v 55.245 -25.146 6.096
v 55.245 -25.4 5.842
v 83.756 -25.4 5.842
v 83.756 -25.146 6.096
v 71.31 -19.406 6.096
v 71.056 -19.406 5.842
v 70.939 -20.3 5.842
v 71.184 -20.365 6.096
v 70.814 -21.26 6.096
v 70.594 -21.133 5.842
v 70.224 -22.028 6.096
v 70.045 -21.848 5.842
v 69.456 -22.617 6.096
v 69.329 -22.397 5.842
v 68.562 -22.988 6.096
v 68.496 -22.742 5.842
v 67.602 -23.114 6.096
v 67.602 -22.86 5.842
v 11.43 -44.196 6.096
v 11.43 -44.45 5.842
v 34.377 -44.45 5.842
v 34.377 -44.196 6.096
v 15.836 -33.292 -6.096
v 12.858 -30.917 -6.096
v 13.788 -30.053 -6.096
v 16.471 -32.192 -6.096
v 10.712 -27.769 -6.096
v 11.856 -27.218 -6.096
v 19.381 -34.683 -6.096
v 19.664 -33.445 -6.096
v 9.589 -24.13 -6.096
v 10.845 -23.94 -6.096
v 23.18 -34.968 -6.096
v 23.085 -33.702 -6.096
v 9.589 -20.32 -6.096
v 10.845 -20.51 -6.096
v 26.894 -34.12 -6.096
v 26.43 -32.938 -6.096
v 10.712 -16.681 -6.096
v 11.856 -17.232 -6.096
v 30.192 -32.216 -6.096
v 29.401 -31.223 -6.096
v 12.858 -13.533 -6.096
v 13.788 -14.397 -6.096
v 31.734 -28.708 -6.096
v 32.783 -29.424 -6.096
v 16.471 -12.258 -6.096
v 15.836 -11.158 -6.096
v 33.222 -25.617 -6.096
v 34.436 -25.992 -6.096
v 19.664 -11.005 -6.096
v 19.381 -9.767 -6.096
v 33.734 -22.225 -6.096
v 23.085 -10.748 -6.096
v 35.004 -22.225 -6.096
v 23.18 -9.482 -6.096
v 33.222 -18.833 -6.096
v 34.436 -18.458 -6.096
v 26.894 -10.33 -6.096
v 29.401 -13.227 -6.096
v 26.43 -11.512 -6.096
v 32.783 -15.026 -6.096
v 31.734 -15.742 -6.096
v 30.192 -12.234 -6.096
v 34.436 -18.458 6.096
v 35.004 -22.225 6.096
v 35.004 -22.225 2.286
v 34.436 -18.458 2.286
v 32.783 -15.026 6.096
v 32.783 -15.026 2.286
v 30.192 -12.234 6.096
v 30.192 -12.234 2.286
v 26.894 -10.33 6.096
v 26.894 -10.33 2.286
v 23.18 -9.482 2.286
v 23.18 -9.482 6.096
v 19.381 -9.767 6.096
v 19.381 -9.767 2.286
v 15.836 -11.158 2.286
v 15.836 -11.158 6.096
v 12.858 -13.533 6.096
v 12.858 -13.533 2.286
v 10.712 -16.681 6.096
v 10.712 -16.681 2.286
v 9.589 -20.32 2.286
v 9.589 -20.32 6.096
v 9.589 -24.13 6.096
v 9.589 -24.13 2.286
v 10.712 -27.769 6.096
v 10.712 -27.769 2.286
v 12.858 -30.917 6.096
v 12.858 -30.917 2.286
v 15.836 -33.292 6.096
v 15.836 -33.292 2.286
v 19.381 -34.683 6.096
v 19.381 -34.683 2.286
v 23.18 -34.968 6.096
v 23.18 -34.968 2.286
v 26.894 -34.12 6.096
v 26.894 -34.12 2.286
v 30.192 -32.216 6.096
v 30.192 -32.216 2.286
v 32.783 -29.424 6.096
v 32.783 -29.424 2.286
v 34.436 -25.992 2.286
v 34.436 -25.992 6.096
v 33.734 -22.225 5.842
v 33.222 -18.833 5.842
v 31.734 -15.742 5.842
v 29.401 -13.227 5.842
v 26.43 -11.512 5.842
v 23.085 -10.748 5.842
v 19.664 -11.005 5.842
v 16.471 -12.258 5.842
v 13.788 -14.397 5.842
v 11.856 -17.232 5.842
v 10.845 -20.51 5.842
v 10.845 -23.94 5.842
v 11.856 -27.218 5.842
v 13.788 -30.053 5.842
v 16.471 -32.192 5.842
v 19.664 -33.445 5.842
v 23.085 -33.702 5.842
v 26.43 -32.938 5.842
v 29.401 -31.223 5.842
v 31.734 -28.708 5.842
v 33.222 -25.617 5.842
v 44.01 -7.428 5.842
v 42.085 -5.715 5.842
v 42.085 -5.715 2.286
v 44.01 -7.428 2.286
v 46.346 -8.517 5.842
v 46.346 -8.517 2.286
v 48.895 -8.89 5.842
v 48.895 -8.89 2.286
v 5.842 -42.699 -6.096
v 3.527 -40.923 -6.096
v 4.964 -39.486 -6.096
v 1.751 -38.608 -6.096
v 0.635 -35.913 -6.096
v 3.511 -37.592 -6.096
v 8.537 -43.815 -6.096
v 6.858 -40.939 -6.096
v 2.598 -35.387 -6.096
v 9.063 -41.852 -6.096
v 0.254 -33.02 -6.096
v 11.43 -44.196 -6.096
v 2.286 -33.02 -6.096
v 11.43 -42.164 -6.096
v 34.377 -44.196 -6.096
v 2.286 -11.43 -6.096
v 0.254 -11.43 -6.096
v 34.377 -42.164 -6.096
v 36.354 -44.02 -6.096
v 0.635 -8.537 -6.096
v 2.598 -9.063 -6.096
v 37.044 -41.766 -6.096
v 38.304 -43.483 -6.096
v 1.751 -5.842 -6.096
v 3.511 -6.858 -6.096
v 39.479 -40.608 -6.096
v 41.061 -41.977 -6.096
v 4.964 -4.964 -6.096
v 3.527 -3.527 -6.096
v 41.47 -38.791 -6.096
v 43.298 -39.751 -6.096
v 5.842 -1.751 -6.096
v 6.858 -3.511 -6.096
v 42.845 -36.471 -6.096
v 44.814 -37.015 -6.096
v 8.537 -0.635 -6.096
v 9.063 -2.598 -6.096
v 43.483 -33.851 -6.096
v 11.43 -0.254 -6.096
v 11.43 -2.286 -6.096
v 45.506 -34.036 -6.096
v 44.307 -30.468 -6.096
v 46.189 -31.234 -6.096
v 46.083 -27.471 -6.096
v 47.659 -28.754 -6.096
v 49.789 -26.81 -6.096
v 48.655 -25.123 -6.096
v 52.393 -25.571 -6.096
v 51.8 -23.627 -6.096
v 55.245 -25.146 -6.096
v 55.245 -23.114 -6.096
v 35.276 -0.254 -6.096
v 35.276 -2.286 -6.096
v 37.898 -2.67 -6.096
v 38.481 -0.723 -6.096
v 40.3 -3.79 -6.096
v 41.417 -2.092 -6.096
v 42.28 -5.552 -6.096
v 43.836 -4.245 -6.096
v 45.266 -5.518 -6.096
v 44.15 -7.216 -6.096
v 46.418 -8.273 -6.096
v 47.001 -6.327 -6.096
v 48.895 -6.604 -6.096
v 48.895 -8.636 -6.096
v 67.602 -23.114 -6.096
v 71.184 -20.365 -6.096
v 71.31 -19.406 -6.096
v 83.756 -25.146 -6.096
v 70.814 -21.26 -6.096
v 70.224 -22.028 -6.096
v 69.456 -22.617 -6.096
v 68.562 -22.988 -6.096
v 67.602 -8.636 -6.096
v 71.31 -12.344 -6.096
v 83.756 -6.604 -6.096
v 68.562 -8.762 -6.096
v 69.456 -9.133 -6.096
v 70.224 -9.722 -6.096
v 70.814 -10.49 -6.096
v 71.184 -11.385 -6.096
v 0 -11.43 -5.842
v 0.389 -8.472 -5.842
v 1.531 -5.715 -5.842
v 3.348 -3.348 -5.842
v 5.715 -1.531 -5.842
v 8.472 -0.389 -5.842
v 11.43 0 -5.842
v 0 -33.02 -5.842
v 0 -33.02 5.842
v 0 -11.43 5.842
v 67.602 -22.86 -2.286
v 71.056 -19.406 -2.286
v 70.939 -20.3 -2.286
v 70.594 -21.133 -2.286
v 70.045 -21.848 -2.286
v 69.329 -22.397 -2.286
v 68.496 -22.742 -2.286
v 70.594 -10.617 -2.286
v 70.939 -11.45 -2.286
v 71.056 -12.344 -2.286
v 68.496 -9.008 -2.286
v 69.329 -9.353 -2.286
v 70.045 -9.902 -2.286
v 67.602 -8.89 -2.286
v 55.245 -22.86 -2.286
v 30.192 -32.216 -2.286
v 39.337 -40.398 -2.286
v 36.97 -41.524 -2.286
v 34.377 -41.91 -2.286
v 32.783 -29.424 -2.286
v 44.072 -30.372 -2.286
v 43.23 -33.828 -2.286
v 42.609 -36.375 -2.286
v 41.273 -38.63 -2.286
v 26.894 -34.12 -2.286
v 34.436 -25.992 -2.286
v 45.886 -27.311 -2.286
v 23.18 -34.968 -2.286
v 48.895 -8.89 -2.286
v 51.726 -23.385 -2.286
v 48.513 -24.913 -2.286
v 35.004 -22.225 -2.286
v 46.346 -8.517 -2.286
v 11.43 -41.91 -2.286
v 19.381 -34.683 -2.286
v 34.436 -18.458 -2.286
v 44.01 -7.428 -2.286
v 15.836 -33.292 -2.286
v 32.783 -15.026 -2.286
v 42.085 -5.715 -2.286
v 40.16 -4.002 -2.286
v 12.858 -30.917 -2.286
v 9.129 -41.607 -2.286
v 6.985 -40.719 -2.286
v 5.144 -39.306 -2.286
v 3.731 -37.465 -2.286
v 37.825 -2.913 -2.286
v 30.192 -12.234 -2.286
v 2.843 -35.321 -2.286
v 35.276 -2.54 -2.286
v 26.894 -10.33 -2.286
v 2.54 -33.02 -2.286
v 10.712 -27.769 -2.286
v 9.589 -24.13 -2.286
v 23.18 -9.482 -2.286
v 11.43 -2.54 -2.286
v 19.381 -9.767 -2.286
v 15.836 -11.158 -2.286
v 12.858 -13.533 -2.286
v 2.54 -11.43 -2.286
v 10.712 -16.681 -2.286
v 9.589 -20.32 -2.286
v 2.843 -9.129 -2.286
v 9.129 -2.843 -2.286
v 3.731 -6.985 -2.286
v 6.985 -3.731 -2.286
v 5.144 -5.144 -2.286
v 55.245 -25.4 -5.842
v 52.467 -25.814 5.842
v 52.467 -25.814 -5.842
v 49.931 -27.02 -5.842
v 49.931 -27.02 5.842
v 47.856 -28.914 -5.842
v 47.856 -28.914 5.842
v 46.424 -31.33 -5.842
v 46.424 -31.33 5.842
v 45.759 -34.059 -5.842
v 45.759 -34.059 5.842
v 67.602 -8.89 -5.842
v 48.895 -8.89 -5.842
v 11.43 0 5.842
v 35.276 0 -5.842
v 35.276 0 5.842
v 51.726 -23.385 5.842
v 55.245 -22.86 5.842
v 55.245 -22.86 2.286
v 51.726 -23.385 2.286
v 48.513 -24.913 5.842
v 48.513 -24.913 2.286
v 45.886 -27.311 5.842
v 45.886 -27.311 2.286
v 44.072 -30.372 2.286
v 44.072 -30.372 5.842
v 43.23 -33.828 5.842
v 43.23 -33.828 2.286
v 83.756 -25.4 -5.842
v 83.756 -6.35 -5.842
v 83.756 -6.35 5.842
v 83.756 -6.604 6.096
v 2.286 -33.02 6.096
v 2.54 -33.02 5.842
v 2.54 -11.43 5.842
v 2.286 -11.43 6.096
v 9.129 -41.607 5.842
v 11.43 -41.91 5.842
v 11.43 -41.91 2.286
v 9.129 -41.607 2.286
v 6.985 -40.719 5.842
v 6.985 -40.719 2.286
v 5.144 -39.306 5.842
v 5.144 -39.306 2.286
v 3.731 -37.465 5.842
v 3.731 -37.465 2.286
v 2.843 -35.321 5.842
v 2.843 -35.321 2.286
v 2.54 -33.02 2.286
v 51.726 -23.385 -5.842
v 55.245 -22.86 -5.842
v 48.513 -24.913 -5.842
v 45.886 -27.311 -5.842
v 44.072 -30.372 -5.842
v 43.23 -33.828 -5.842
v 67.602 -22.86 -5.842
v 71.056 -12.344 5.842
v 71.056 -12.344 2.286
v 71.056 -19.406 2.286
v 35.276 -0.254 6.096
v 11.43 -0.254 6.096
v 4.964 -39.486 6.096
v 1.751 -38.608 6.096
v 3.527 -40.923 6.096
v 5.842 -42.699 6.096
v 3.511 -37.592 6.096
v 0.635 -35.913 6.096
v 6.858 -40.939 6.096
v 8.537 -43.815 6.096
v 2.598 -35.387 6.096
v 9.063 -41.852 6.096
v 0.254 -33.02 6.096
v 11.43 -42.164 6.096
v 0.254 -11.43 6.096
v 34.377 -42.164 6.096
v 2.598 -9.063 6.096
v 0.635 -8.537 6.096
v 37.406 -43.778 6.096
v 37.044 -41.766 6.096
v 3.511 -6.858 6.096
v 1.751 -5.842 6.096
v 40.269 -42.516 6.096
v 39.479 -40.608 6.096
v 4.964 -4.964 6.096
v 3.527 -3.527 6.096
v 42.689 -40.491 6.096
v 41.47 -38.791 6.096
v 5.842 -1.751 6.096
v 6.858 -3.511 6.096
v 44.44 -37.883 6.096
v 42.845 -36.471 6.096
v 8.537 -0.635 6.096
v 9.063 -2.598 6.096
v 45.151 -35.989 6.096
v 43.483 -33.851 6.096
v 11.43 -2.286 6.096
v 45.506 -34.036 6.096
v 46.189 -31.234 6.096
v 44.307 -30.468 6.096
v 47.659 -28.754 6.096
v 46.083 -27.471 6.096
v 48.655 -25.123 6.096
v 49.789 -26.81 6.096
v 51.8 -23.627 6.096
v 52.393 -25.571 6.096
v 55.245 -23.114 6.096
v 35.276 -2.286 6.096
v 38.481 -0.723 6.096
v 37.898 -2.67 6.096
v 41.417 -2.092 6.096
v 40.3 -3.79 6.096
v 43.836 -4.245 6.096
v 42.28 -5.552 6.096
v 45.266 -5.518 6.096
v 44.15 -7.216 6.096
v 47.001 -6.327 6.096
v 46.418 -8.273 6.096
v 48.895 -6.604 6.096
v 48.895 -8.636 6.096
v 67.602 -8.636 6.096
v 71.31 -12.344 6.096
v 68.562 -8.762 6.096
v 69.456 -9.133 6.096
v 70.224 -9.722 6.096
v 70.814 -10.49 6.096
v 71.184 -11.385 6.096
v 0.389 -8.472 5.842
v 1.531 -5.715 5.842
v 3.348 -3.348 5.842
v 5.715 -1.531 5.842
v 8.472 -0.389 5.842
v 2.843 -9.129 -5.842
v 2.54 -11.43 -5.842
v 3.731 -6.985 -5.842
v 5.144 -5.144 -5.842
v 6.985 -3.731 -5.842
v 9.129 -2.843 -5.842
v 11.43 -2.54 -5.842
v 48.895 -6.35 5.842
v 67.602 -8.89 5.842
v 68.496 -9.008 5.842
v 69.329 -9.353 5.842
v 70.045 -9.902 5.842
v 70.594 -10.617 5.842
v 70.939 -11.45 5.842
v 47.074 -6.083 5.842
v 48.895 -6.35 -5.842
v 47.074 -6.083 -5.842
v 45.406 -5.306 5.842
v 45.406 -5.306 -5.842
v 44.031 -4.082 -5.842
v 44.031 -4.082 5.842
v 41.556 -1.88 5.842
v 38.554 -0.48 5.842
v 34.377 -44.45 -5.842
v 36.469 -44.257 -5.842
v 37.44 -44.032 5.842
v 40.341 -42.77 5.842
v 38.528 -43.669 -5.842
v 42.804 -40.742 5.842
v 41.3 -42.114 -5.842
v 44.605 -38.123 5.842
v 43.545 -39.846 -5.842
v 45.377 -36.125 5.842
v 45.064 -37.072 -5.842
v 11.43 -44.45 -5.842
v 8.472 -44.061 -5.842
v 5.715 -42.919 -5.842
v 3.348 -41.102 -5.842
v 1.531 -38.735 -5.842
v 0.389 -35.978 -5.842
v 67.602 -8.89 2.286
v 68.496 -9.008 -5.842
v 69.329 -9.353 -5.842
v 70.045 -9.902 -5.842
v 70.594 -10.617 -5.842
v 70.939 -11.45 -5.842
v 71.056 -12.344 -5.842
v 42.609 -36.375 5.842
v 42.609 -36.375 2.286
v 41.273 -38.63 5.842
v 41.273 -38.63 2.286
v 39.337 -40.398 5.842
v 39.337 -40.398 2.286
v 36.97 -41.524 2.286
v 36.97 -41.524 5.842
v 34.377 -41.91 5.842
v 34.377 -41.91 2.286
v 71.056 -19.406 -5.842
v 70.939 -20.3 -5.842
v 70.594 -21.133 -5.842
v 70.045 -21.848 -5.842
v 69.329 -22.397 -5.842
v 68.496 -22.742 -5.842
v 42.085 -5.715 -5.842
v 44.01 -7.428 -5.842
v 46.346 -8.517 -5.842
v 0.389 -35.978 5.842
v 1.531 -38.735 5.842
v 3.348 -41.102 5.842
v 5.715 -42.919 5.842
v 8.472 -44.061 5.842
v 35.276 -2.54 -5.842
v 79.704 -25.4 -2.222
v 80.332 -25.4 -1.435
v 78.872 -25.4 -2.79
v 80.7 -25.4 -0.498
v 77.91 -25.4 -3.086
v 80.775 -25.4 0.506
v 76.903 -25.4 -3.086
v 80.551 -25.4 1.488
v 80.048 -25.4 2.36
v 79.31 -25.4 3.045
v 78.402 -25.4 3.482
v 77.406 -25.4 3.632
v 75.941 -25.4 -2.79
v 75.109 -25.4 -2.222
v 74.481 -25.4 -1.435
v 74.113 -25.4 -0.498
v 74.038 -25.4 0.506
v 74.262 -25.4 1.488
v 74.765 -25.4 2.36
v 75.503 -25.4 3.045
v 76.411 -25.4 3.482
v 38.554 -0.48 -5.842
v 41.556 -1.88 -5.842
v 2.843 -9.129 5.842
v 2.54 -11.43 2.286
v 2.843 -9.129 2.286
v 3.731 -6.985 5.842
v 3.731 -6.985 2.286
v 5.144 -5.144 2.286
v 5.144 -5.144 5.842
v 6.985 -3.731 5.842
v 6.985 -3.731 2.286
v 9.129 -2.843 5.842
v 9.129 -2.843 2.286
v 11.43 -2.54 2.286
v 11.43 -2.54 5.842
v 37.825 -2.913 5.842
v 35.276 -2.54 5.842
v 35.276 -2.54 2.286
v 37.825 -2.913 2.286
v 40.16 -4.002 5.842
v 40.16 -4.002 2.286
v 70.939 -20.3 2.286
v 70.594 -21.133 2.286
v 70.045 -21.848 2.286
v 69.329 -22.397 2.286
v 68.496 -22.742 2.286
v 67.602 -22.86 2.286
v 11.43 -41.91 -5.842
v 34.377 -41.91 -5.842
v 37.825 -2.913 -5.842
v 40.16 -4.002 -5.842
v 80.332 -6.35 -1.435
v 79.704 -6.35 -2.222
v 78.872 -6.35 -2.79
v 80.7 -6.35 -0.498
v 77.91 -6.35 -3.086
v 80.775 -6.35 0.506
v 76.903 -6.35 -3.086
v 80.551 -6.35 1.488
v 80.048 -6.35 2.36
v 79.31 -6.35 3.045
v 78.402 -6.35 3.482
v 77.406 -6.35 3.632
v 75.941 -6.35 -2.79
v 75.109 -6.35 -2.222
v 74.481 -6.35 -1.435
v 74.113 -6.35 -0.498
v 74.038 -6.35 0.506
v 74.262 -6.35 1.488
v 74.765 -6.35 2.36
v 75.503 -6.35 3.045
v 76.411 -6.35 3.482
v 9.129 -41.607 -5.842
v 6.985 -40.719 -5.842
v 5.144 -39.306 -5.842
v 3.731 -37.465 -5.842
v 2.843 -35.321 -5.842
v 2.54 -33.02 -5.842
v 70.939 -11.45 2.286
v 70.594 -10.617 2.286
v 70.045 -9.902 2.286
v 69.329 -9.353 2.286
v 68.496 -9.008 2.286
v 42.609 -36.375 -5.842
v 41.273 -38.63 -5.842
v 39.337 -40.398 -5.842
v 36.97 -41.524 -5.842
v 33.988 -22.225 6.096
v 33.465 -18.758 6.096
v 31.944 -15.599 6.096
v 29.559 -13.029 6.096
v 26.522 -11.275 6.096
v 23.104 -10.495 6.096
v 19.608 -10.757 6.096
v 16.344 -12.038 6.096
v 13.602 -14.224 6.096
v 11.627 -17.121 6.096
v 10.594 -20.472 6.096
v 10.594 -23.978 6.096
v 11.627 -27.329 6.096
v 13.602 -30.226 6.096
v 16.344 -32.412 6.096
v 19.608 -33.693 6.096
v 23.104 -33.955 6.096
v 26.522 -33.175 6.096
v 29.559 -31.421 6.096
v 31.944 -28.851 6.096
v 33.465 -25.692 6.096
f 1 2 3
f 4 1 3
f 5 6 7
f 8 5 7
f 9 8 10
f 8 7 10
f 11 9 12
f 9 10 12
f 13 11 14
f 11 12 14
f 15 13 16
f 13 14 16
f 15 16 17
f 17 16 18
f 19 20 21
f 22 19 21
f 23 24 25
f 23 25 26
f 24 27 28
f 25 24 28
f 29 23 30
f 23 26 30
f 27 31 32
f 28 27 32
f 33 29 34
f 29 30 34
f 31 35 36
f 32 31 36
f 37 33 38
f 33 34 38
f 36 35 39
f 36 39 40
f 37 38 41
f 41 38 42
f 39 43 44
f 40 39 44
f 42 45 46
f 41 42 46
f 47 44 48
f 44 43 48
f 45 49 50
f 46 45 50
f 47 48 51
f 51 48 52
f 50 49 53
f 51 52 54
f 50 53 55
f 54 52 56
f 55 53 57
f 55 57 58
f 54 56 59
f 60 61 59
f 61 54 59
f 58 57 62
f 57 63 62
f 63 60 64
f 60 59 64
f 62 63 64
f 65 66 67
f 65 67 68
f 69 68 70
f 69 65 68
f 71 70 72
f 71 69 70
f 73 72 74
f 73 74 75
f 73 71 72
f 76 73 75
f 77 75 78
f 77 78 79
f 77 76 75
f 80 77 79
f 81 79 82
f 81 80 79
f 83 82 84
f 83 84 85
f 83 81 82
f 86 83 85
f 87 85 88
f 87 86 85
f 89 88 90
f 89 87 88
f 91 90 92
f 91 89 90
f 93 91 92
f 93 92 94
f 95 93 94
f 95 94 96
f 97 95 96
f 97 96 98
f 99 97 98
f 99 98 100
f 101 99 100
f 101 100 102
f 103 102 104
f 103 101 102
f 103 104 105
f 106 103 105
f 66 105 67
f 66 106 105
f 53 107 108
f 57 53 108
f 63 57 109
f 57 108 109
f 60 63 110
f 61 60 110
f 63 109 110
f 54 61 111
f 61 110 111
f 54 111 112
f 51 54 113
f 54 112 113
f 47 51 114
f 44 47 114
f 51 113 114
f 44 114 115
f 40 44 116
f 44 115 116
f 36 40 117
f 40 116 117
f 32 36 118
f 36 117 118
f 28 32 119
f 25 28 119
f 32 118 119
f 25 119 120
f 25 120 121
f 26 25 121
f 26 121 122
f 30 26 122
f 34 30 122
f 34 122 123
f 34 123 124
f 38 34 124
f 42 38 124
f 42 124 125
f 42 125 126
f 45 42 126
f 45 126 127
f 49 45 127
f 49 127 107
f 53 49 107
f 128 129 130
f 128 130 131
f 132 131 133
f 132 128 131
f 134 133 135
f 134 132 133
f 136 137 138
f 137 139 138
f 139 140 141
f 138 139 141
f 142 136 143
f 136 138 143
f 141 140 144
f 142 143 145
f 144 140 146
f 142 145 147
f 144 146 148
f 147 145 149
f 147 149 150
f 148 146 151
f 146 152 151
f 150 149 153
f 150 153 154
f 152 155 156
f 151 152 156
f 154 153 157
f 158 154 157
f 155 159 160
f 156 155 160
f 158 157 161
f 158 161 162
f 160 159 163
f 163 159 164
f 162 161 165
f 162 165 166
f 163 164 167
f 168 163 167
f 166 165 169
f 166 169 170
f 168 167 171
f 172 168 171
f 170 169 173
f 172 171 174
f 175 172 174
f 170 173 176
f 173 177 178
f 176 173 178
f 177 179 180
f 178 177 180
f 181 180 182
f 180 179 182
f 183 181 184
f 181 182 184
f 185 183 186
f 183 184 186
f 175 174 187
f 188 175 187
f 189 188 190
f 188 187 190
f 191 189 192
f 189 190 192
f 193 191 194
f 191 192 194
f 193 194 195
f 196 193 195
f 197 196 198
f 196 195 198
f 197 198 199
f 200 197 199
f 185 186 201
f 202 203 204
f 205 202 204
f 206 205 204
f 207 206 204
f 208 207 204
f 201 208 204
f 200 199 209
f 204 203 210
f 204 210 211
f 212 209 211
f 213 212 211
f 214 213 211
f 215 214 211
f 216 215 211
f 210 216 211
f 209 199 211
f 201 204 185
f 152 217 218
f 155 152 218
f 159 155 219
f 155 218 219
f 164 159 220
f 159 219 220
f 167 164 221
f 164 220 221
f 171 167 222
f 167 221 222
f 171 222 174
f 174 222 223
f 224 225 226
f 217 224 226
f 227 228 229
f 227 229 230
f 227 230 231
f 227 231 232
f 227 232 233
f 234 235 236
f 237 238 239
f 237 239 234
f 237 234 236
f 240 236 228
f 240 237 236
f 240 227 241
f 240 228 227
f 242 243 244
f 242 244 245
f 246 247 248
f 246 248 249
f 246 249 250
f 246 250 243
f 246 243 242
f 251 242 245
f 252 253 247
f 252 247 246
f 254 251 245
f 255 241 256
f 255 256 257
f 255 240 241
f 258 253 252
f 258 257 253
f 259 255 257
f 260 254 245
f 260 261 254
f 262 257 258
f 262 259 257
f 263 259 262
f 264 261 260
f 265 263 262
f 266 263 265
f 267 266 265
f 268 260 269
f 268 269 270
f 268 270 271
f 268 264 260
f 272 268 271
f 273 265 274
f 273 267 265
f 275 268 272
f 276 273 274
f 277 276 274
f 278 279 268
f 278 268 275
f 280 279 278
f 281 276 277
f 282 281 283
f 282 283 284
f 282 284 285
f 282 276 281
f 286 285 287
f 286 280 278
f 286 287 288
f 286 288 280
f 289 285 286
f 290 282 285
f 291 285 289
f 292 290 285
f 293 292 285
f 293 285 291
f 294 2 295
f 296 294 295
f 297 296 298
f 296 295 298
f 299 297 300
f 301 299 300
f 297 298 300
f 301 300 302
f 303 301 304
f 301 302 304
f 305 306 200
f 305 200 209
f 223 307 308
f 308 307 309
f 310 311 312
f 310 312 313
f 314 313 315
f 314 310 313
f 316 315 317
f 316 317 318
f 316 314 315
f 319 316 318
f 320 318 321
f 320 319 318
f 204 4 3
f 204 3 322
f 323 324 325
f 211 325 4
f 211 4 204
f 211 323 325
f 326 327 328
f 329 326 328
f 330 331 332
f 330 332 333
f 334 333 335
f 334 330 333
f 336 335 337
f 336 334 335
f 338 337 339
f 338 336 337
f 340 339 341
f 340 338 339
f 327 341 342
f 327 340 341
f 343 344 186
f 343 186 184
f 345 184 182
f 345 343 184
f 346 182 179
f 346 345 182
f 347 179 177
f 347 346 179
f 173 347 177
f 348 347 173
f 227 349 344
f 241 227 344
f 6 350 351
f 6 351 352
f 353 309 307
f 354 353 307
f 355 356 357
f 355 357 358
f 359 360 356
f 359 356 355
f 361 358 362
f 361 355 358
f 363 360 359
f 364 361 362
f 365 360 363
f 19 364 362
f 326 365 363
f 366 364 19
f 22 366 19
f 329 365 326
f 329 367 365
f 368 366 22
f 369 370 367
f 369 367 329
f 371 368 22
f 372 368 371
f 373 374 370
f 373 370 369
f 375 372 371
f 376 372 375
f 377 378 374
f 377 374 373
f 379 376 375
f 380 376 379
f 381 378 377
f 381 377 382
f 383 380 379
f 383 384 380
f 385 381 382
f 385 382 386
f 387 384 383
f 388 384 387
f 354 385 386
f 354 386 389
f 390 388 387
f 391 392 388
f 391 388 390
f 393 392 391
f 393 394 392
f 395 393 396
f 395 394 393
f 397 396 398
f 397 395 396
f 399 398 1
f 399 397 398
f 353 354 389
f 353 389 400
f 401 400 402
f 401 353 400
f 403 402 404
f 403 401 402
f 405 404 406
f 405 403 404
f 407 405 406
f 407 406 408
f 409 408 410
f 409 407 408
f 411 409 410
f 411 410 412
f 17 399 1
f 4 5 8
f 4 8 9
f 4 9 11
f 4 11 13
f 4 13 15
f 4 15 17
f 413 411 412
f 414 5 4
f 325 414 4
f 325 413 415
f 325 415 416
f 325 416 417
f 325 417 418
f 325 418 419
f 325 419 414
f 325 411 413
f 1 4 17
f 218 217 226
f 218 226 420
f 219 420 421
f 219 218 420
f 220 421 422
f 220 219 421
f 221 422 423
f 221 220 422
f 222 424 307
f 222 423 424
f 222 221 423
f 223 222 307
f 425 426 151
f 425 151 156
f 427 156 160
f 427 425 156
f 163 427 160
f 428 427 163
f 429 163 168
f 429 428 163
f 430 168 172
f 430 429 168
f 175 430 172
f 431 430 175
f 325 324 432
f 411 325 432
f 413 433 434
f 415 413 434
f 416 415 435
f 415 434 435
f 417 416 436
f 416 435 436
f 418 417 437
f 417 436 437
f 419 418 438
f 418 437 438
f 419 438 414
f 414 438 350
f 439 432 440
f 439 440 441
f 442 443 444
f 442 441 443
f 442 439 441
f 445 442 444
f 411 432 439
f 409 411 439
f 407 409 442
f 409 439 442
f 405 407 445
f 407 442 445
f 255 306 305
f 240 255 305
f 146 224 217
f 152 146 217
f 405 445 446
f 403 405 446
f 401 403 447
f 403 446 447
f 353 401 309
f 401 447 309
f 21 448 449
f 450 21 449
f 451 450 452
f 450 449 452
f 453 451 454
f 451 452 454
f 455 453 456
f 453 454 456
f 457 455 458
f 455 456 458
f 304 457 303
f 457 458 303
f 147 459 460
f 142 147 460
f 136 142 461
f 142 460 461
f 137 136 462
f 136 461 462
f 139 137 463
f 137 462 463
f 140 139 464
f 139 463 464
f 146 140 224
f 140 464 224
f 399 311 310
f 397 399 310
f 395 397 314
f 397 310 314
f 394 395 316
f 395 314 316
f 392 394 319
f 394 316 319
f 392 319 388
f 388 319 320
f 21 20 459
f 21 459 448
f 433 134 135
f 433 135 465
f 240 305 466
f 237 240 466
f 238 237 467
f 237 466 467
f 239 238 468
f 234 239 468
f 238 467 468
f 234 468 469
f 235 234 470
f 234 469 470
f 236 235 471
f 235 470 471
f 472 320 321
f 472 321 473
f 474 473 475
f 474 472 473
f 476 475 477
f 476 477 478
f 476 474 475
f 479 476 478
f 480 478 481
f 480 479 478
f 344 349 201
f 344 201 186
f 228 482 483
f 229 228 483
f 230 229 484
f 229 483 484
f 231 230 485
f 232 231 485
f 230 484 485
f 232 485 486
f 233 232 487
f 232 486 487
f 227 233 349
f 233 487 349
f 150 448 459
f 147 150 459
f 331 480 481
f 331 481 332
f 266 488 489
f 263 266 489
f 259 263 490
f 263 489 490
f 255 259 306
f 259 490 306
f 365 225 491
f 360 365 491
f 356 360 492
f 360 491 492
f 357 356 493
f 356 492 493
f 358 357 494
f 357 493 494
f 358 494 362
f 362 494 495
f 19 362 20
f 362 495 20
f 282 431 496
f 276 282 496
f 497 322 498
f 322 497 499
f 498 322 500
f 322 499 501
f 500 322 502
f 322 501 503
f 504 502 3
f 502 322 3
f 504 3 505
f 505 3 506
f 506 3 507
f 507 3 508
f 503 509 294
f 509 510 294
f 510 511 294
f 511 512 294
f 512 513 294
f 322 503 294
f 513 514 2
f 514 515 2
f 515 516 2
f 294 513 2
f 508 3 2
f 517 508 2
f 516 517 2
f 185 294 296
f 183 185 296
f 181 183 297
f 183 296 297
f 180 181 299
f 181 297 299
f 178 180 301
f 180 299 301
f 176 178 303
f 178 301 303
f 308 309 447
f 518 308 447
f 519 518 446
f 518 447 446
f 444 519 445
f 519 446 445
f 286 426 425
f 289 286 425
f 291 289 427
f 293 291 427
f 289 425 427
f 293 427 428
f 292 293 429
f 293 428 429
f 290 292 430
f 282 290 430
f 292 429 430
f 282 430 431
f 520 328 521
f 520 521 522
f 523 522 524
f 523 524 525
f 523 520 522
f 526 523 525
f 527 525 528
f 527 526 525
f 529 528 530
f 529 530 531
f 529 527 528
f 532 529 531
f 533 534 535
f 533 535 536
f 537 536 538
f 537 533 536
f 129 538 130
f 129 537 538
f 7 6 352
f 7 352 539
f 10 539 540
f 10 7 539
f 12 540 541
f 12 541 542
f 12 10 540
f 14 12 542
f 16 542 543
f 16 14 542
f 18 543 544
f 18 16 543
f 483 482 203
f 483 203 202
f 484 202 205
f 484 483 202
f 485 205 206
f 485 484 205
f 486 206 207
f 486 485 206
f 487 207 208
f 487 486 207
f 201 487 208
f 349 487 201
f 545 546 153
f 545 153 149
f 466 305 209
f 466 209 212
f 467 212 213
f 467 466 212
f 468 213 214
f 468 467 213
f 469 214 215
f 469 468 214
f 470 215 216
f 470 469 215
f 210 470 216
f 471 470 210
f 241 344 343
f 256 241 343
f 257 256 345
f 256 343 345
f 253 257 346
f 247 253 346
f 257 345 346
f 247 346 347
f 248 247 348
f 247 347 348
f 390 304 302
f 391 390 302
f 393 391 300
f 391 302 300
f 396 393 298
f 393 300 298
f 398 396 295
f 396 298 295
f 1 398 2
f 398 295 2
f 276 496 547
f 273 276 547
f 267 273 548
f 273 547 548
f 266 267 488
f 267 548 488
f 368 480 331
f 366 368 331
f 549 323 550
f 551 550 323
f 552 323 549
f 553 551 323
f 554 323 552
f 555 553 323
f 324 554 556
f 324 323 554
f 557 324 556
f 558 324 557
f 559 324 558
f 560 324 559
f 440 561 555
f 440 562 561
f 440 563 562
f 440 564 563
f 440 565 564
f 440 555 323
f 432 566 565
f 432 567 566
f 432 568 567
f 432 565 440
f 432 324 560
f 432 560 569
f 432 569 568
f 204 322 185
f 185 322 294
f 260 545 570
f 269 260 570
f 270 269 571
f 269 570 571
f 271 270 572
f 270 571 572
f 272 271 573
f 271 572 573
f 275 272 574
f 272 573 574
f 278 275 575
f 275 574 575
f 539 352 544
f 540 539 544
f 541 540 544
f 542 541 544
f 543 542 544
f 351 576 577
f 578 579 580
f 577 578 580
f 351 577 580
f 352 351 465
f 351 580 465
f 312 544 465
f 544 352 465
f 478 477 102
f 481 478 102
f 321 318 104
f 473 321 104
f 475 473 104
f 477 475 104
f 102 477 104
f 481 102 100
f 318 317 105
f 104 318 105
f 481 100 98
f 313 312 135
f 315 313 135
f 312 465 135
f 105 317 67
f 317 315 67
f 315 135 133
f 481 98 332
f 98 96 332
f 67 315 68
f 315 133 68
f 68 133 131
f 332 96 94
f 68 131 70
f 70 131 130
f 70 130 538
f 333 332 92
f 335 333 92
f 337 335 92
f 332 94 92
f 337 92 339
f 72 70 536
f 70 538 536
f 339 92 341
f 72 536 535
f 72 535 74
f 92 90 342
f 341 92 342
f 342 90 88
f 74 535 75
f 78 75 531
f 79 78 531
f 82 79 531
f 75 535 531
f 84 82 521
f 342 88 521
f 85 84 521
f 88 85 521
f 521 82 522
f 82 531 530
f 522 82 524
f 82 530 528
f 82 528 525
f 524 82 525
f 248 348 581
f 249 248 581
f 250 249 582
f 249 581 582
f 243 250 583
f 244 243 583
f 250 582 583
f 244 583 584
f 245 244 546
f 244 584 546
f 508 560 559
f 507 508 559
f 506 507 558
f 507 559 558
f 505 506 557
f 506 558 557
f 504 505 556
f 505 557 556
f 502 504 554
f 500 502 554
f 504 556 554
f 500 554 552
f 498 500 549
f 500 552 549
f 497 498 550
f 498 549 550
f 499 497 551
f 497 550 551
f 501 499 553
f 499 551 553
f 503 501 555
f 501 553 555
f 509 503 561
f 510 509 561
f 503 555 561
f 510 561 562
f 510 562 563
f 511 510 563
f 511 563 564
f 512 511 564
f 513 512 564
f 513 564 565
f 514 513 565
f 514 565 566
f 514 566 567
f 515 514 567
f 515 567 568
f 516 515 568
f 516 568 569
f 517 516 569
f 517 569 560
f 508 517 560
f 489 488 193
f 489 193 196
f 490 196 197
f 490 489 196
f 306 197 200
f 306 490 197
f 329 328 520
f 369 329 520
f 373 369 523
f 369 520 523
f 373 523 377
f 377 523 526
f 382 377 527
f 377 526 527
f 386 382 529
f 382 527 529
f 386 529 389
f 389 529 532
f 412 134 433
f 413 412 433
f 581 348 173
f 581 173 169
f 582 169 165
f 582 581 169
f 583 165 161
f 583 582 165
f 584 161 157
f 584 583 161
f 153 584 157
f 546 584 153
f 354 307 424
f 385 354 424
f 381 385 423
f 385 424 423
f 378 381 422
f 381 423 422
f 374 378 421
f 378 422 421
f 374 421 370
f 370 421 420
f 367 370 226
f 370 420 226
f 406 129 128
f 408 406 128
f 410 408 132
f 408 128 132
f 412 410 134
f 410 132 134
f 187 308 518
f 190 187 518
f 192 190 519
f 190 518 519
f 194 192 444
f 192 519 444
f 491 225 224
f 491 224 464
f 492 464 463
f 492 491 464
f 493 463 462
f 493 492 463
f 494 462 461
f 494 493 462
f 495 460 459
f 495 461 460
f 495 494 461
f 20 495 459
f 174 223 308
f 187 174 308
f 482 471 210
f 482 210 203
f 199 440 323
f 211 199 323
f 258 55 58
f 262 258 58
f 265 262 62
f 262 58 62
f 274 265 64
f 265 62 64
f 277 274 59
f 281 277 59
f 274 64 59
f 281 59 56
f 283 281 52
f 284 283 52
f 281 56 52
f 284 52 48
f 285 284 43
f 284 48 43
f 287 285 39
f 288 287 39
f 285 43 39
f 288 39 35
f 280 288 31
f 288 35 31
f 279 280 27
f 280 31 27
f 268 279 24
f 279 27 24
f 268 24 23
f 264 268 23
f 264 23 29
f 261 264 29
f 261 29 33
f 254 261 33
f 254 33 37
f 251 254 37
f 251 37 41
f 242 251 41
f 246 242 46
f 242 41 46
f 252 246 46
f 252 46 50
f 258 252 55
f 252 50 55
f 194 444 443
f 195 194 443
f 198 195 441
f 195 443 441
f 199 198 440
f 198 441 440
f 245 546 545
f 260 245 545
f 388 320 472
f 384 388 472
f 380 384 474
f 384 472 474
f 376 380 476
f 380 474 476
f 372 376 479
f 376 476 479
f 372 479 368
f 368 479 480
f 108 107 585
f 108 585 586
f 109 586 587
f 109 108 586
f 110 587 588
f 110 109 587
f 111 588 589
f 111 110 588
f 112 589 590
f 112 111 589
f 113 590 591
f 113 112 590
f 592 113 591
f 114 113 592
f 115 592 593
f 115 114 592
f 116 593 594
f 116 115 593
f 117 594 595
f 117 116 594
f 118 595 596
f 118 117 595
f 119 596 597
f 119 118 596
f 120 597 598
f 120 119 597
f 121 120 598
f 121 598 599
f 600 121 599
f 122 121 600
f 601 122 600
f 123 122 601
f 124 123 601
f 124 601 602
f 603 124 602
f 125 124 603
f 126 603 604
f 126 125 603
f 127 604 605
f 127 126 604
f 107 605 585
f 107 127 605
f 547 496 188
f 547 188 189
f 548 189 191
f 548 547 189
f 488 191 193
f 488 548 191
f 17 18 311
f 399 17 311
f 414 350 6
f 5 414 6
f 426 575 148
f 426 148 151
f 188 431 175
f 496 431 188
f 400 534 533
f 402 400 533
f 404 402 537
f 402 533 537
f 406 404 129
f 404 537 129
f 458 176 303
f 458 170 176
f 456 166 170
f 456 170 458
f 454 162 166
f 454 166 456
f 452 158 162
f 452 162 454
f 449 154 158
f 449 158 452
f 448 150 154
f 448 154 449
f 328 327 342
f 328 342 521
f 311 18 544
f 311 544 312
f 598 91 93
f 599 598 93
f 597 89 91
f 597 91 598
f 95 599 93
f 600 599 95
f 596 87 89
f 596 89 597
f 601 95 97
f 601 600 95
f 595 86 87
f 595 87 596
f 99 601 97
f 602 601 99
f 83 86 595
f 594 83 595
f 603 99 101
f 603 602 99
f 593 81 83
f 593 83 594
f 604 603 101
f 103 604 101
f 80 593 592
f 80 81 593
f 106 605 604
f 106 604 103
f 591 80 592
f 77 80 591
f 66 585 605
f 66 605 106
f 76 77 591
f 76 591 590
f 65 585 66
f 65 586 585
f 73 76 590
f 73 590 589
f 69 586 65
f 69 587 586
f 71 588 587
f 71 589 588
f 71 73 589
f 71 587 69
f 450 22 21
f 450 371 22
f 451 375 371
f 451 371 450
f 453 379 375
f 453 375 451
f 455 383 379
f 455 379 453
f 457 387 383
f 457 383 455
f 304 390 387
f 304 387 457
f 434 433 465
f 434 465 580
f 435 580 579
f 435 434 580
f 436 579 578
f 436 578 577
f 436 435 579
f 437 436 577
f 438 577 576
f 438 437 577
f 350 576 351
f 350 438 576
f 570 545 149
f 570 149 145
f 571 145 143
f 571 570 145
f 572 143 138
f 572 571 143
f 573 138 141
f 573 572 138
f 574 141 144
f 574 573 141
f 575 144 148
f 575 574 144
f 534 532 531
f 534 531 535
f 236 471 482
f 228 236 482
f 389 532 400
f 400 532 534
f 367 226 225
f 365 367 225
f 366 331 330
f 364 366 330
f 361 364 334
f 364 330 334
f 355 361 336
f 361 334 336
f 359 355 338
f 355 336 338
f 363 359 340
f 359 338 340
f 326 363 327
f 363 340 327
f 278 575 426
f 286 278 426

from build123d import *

# Parameters (mm, degrees)
SKETCH1_W           = 96.52
SKETCH1_H           = 44.45
BOSS_EXTRUDE1_DEPTH = 6.096
CUT_EXTRUDE1_REACH  = 108.961
SKETCH2_R           = 11.50874
CUT_EXTRUDE2_REACH  = 108.438
SKETCH3_R           = 3.3782
CUT_EXTRUDE3_REACH  = 108.961
SKETCH7_W           = 12.7635
SKETCH7_H           = 12.192
CUT_EXTRUDE5_DEPTH  = 104.946532487
FILLET1_R           = 11.43
SKETCH5_R           = 12.77874
CUT_EXTRUDE4_DEPTH  = 3.81
CHAMFER1_SIZE       = 0.254


with BuildPart() as part:
    # Sketch1 → Boss-Extrude1 (new, symmetric)
    with BuildSketch(Plane.XY):
        with Locations((48.26, -22.225)):
            Rectangle(SKETCH1_W, SKETCH1_H)
    extrude(amount=BOSS_EXTRUDE1_DEPTH, both=True)

    # Sketch2 → Cut-Extrude1 (cut, up to next)
    with BuildSketch(Plane.XY.offset(6.096), mode=Mode.PRIVATE) as cut_extrude1_sk1:
        with Locations((22.225, -22.225)):
            Circle(SKETCH2_R)
    cut_extrude1_tool1 = extrude(cut_extrude1_sk1.sketch, amount=-CUT_EXTRUDE1_REACH, mode=Mode.PRIVATE) & part.part
    add(cut_extrude1_tool1.solids().sort_by_distance((22.225, -22.225, 6.096))[0], mode=Mode.SUBTRACT)

    # Sketch3 → Cut-Extrude2 (cut, up to next)
    with BuildSketch(Plane(origin=(0, 0, 0), x_dir=(1, 0, 0), z_dir=(0, 1, 0)), mode=Mode.PRIVATE) as cut_extrude2_sk1:
        with Locations(Location((77.4065, -0.254, 0), (0, 0, 270))):
            Circle(SKETCH3_R)
    cut_extrude2_tool1 = extrude(cut_extrude2_sk1.sketch, amount=-CUT_EXTRUDE2_REACH, mode=Mode.PRIVATE) & part.part
    add(cut_extrude2_tool1.solids().sort_by_distance((77.4065, 0, 0.254))[0], mode=Mode.SUBTRACT)

    # Sketch4 → Cut-Extrude3 (cut, up to next)
    with BuildSketch(Plane.XY.offset(6.096), mode=Mode.PRIVATE) as cut_extrude3_sk1:
        with BuildLine():
            Line((48.895, 6.35), (96.52, 6.35))
            ThreePointArc((96.52, 6.35), (102.87, 0), (96.52, -6.35))
            Line((96.52, -6.35), (48.895, -6.35))
            ThreePointArc((48.895, -6.35), (42.545, 0), (48.895, 6.35))
        make_face()
    cut_extrude3_tool1 = extrude(cut_extrude3_sk1.sketch, amount=-CUT_EXTRUDE3_REACH, mode=Mode.PRIVATE) & part.part
    # Sketch4 → Cut-Extrude3 (cut, up to next)
    with BuildSketch(Plane.XY.offset(6.096), mode=Mode.PRIVATE) as cut_extrude3_sk2:
        with BuildLine():
            Line((45.72, -34.925), (45.72, -44.45))
            Line((45.72, -44.45), (55.245, -44.45))
            Line((55.245, -44.45), (96.52, -44.45))
            ThreePointArc((96.52, -44.45), (106.045, -34.925), (96.52, -25.4))
            Line((96.52, -25.4), (55.245, -25.4))
            ThreePointArc((55.245, -25.4), (48.509807909, -28.189807909), (45.72, -34.925))
        make_face()
    cut_extrude3_tool2 = extrude(cut_extrude3_sk2.sketch, amount=-CUT_EXTRUDE3_REACH, mode=Mode.PRIVATE) & part.part
    add(cut_extrude3_tool1.solids().sort_by_distance((72.7075, 0, 6.096))[0], mode=Mode.SUBTRACT)
    add(cut_extrude3_tool2.solids().sort_by_distance((75.382091, -35.05704, 6.096))[0], mode=Mode.SUBTRACT)

    # Sketch7 → Cut-Extrude5 (cut, through all)
    with BuildSketch(Plane(origin=(0, -6.35, 0), x_dir=(1, 0, 0), z_dir=(0, 1, 0))):
        with Locations((90.13825, 0)):
            Rectangle(SKETCH7_W, SKETCH7_H)
    extrude(amount=-CUT_EXTRUDE5_DEPTH, mode=Mode.SUBTRACT)

    # Fillet1
    fillet1_edges = [part.edges().sort_by_distance(p)[0] for p in [
        (42.545, 0, 0),
        (45.72, -44.45, 0),
        (0, -44.45, 0),
        (0, 0, 0),
    ]]
    fillet(fillet1_edges, radius=FILLET1_R)

    # Sketch5 → Cut-Extrude4 (cut)
    with BuildSketch(Plane.XY.offset(6.096)):
        with BuildLine():
            Line((71.0565, -12.3444), (71.0565, -19.4056))
            ThreePointArc((71.0565, -19.4056), (70.044729665, -21.848229665), (67.6021, -22.86))
            Line((67.6021, -22.86), (55.245, -22.86))
            ThreePointArc((55.245, -22.86), (47.110778659, -26.014406968), (43.229958807, -33.828181818))
            ThreePointArc((43.229958807, -33.828181818), (40.370407336, -39.585700129), (34.376770559, -41.91))
            Line((34.376770559, -41.91), (11.43, -41.91))
            ThreePointArc((11.43, -41.91), (5.143820715, -39.306179285), (2.54, -33.02))
            Line((2.54, -33.02), (2.54, -11.43))
            ThreePointArc((2.54, -11.43), (5.143820715, -5.143820715), (11.43, -2.54))
            Line((11.43, -2.54), (35.275767276, -2.54))
            ThreePointArc((35.275767276, -2.54), (39.032477938, -3.372753262), (42.085383638, -5.715))
            ThreePointArc((42.085383638, -5.715), (45.138289338, -8.057246738), (48.895, -8.89))
            Line((48.895, -8.89), (67.6021, -8.89))
            ThreePointArc((67.6021, -8.89), (70.044729665, -9.901770335), (71.0565, -12.3444))
        make_face()
        with Locations((22.225, -22.225)):
            Circle(SKETCH5_R, mode=Mode.SUBTRACT)
    cut_extrude4 = extrude(amount=-CUT_EXTRUDE4_DEPTH, mode=Mode.SUBTRACT)

    # Mirror3: Cut-Extrude4 across plane
    add(cut_extrude4.mirror(Plane.XY), mode=Mode.SUBTRACT)

    # Chamfer1
    chamfer1_edges = [part.edges().sort_by_distance(p)[0] for p in [
        (70.044729665, -21.848229665, 6.096),
        (71.0565, -15.875, 6.096),
        (70.044729665, -9.901770335, 6.096),
        (58.24855, -8.89, 6.096),
        (45.138289338, -8.057246738, 6.096),
        (39.032477938, -3.372753262, 6.096),
        (23.352883638, -2.54, 6.096),
        (5.143820715, -5.143820715, 6.096),
        (2.54, -22.225, 6.096),
        (5.143820715, -39.306179285, 6.096),
        (22.90338528, -41.91, 6.096),
        (40.370407336, -39.585700129, 6.096),
        (47.110778659, -26.014406968, 6.096),
        (61.42355, -22.86, 6.096),
        (10.71626, -22.225, 6.096),
        (70.044729665, -21.848229665, -6.096),
        (71.0565, -15.875, -6.096),
        (70.044729665, -9.901770335, -6.096),
        (58.24855, -8.89, -6.096),
        (45.138289338, -8.057246738, -6.096),
        (39.032477938, -3.372753262, -6.096),
        (23.352883638, -2.54, -6.096),
        (5.143820715, -5.143820715, -6.096),
        (2.54, -22.225, -6.096),
        (5.143820715, -39.306179285, -6.096),
        (22.90338528, -41.91, -6.096),
        (40.370407336, -39.585700129, -6.096),
        (47.110778659, -26.014406968, -6.096),
        (61.42355, -22.86, -6.096),
        (46.211635241, -5.755176242, -6.096),
        (66.32575, -6.35, 6.096),
        (69.50075, -25.4, -6.096),
        (48.82324631, -27.890321291, 6.096),
        (66.32575, -6.35, -6.096),
        (69.50075, -25.4, 6.096),
        (46.211635241, -5.755176242, 6.096),
        (23.352883638, 0, 6.096),
        (0, -22.225, 6.096),
        (22.90338528, -44.45, 6.096),
        (3.347769491, -3.347769491, 6.096),
        (3.347769491, -41.102230509, 6.096),
        (42.082874987, -41.461614451, 6.096),
        (40.105823841, -1.070682765, 6.096),
        (23.352883638, 0, -6.096),
        (48.82324631, -27.890321291, -6.096),
        (22.90338528, -44.45, -6.096),
        (0, -22.225, -6.096),
        (3.347769491, -3.347769491, -6.096),
        (3.347769491, -41.102230509, -6.096),
        (42.082874987, -41.461614451, -6.096),
        (40.105823841, -1.070682765, -6.096),
    ]]
    chamfer(chamfer1_edges, length=CHAMFER1_SIZE)


solid = part.part
